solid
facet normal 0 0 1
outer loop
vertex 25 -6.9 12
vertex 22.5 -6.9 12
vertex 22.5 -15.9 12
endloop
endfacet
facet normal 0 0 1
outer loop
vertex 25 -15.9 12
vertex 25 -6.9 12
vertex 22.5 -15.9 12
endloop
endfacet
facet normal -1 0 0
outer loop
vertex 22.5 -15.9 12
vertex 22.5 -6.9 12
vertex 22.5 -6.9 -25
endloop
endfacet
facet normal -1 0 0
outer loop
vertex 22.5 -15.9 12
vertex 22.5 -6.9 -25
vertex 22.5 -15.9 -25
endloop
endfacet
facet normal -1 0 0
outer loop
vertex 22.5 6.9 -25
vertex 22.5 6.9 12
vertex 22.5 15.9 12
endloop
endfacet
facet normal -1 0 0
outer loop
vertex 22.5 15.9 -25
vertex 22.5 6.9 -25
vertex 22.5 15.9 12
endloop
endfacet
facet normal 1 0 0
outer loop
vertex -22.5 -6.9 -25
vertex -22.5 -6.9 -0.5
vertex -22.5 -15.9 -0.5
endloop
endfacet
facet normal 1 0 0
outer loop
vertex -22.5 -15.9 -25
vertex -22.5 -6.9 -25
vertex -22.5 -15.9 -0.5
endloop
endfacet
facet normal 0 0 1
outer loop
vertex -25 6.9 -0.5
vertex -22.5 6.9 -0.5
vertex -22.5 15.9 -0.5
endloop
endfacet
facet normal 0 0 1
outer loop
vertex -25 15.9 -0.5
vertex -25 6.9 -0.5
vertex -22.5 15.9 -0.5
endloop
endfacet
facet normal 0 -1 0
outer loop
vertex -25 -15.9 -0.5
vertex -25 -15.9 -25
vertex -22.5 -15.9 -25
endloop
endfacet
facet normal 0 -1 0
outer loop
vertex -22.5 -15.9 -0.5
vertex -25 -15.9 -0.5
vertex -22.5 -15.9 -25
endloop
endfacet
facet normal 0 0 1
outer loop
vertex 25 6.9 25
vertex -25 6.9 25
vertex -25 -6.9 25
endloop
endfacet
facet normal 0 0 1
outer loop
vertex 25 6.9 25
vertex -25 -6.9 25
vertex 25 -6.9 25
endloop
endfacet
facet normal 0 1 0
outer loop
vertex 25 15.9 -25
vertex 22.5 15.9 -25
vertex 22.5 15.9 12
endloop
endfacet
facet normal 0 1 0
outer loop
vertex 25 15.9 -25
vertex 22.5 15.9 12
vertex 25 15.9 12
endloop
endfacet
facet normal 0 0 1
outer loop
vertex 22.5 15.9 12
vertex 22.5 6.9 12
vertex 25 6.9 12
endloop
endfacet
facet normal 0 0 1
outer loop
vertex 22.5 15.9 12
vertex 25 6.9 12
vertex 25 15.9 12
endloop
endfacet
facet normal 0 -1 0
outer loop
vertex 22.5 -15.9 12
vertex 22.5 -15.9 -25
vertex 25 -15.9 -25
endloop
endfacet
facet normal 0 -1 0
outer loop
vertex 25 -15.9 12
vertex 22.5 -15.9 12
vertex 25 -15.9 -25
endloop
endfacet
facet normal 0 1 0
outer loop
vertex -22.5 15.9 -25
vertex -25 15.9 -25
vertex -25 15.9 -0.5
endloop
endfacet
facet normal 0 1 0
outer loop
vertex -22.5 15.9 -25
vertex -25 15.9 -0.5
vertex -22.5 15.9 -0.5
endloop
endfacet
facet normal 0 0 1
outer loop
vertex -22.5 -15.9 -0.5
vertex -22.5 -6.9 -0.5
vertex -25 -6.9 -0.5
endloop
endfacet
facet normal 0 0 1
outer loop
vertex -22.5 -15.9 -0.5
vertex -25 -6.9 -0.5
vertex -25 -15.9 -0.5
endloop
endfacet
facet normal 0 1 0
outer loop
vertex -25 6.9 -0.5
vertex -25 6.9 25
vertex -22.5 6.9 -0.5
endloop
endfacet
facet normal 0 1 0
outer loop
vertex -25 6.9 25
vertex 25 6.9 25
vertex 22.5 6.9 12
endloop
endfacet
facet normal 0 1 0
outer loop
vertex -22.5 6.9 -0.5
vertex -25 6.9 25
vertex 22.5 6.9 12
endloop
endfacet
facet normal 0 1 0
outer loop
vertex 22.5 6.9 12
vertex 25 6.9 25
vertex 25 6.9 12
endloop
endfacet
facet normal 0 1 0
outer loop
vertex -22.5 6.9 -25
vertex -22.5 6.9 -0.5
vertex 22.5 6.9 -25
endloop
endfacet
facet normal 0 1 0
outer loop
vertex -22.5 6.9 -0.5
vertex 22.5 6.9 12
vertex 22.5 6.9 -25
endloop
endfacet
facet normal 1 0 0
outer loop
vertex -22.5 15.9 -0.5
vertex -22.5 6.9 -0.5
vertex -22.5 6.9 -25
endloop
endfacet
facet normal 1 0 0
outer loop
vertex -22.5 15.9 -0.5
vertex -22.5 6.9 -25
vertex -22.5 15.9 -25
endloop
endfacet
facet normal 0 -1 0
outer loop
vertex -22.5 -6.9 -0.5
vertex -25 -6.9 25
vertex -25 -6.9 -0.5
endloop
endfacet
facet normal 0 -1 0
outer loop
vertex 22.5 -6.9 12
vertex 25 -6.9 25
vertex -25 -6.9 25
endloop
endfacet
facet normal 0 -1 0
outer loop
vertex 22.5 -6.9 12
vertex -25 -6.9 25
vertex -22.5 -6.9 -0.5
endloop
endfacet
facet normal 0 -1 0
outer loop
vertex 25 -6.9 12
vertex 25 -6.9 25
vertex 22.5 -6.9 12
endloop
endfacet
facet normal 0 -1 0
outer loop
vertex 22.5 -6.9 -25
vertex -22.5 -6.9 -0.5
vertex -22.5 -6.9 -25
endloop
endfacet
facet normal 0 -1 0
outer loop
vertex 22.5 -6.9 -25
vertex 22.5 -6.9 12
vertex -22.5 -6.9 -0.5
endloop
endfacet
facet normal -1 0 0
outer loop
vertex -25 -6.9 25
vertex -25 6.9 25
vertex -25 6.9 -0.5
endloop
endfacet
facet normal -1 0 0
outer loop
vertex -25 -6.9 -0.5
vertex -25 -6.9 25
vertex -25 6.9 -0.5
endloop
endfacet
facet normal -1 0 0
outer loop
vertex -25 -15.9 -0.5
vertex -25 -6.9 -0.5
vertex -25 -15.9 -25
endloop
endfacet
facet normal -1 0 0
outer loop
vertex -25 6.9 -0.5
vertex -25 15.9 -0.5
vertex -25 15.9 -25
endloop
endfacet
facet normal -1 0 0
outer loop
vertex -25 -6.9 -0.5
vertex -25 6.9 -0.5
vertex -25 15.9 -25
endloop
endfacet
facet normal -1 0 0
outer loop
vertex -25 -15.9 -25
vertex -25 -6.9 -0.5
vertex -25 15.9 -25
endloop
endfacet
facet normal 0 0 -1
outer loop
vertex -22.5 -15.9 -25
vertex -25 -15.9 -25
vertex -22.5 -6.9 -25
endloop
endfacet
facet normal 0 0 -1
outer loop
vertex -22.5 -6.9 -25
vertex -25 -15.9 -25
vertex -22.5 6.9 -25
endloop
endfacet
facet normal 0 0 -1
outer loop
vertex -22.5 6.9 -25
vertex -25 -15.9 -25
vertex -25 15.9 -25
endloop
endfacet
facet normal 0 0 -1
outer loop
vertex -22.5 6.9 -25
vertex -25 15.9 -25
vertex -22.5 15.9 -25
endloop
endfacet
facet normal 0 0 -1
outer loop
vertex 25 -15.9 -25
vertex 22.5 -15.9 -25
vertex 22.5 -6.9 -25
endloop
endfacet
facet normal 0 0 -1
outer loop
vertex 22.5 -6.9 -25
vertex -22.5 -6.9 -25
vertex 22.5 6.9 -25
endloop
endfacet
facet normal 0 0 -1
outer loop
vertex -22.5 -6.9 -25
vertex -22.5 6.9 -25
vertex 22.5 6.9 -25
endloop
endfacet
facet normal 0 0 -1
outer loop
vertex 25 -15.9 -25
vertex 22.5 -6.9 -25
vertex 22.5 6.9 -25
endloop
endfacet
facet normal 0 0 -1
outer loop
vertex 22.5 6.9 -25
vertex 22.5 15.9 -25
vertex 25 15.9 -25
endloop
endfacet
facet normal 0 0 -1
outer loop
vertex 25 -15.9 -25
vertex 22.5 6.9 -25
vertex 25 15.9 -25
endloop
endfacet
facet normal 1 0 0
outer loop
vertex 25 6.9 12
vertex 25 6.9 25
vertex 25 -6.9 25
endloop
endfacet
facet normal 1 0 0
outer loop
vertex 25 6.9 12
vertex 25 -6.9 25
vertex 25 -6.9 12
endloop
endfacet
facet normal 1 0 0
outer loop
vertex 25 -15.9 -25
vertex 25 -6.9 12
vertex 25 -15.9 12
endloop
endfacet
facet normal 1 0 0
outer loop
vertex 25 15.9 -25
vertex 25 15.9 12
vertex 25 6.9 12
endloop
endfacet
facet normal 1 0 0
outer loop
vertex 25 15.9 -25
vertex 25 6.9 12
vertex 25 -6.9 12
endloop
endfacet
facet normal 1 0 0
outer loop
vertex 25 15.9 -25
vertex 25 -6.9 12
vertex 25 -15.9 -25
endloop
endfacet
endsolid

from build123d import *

# Parameters (mm, degrees)
SKETCH1_W           = 50
SKETCH1_H           = 50
BOSS_EXTRUDE1_DEPTH = 15.9
SKETCH2_W           = 45
SKETCH2_H           = 9
CUT_EXTRUDE1_DEPTH  = 59.118929791
SKETCH3_W           = 13
SKETCH3_H           = 9
CUT_EXTRUDE2_DEPTH  = 56.982675892
SKETCH4_W           = 25.5
SKETCH4_H           = 9
CUT_EXTRUDE3_DEPTH  = 56.982675892


with BuildPart() as part:
    # Sketch1 → Boss-Extrude1 (new, symmetric)
    with BuildSketch(Plane(origin=(0, 0, 0), x_dir=(1, 0, 0), z_dir=(0, 1, 0))):
        Rectangle(SKETCH1_W, SKETCH1_H)
    extrude(amount=BOSS_EXTRUDE1_DEPTH, both=True)

    # Sketch2 → Cut-Extrude1 (cut, through all)
    with BuildSketch(Plane.XY.offset(25)):
        with Locations((0, 11.4)):
            Rectangle(SKETCH2_W, SKETCH2_H)
    cut_extrude1 = extrude(amount=-CUT_EXTRUDE1_DEPTH, mode=Mode.SUBTRACT)

    # Sketch3 → Cut-Extrude2 (cut, through all)
    with BuildSketch(Plane.ZY.offset(-22.5)):
        with Locations((18.5, 11.4)):
            Rectangle(SKETCH3_W, SKETCH3_H)
    cut_extrude2 = extrude(amount=-CUT_EXTRUDE2_DEPTH, mode=Mode.SUBTRACT)

    # Sketch4 → Cut-Extrude3 (cut, through all)
    with BuildSketch(Plane(origin=(-22.5, 0, 0), x_dir=(0, 0, -1), z_dir=(1, 0, 0))):
        with Locations((-12.25, 11.4)):
            Rectangle(SKETCH4_W, SKETCH4_H)
    cut_extrude3 = extrude(amount=-CUT_EXTRUDE3_DEPTH, mode=Mode.SUBTRACT)

    # Mirror1: Cut-Extrude1, Cut-Extrude2, Cut-Extrude3 across plane
    add(cut_extrude1.mirror(Plane.ZX), mode=Mode.SUBTRACT)
    add(cut_extrude2.mirror(Plane.ZX), mode=Mode.SUBTRACT)
    add(cut_extrude3.mirror(Plane.ZX), mode=Mode.SUBTRACT)


solid = part.part
